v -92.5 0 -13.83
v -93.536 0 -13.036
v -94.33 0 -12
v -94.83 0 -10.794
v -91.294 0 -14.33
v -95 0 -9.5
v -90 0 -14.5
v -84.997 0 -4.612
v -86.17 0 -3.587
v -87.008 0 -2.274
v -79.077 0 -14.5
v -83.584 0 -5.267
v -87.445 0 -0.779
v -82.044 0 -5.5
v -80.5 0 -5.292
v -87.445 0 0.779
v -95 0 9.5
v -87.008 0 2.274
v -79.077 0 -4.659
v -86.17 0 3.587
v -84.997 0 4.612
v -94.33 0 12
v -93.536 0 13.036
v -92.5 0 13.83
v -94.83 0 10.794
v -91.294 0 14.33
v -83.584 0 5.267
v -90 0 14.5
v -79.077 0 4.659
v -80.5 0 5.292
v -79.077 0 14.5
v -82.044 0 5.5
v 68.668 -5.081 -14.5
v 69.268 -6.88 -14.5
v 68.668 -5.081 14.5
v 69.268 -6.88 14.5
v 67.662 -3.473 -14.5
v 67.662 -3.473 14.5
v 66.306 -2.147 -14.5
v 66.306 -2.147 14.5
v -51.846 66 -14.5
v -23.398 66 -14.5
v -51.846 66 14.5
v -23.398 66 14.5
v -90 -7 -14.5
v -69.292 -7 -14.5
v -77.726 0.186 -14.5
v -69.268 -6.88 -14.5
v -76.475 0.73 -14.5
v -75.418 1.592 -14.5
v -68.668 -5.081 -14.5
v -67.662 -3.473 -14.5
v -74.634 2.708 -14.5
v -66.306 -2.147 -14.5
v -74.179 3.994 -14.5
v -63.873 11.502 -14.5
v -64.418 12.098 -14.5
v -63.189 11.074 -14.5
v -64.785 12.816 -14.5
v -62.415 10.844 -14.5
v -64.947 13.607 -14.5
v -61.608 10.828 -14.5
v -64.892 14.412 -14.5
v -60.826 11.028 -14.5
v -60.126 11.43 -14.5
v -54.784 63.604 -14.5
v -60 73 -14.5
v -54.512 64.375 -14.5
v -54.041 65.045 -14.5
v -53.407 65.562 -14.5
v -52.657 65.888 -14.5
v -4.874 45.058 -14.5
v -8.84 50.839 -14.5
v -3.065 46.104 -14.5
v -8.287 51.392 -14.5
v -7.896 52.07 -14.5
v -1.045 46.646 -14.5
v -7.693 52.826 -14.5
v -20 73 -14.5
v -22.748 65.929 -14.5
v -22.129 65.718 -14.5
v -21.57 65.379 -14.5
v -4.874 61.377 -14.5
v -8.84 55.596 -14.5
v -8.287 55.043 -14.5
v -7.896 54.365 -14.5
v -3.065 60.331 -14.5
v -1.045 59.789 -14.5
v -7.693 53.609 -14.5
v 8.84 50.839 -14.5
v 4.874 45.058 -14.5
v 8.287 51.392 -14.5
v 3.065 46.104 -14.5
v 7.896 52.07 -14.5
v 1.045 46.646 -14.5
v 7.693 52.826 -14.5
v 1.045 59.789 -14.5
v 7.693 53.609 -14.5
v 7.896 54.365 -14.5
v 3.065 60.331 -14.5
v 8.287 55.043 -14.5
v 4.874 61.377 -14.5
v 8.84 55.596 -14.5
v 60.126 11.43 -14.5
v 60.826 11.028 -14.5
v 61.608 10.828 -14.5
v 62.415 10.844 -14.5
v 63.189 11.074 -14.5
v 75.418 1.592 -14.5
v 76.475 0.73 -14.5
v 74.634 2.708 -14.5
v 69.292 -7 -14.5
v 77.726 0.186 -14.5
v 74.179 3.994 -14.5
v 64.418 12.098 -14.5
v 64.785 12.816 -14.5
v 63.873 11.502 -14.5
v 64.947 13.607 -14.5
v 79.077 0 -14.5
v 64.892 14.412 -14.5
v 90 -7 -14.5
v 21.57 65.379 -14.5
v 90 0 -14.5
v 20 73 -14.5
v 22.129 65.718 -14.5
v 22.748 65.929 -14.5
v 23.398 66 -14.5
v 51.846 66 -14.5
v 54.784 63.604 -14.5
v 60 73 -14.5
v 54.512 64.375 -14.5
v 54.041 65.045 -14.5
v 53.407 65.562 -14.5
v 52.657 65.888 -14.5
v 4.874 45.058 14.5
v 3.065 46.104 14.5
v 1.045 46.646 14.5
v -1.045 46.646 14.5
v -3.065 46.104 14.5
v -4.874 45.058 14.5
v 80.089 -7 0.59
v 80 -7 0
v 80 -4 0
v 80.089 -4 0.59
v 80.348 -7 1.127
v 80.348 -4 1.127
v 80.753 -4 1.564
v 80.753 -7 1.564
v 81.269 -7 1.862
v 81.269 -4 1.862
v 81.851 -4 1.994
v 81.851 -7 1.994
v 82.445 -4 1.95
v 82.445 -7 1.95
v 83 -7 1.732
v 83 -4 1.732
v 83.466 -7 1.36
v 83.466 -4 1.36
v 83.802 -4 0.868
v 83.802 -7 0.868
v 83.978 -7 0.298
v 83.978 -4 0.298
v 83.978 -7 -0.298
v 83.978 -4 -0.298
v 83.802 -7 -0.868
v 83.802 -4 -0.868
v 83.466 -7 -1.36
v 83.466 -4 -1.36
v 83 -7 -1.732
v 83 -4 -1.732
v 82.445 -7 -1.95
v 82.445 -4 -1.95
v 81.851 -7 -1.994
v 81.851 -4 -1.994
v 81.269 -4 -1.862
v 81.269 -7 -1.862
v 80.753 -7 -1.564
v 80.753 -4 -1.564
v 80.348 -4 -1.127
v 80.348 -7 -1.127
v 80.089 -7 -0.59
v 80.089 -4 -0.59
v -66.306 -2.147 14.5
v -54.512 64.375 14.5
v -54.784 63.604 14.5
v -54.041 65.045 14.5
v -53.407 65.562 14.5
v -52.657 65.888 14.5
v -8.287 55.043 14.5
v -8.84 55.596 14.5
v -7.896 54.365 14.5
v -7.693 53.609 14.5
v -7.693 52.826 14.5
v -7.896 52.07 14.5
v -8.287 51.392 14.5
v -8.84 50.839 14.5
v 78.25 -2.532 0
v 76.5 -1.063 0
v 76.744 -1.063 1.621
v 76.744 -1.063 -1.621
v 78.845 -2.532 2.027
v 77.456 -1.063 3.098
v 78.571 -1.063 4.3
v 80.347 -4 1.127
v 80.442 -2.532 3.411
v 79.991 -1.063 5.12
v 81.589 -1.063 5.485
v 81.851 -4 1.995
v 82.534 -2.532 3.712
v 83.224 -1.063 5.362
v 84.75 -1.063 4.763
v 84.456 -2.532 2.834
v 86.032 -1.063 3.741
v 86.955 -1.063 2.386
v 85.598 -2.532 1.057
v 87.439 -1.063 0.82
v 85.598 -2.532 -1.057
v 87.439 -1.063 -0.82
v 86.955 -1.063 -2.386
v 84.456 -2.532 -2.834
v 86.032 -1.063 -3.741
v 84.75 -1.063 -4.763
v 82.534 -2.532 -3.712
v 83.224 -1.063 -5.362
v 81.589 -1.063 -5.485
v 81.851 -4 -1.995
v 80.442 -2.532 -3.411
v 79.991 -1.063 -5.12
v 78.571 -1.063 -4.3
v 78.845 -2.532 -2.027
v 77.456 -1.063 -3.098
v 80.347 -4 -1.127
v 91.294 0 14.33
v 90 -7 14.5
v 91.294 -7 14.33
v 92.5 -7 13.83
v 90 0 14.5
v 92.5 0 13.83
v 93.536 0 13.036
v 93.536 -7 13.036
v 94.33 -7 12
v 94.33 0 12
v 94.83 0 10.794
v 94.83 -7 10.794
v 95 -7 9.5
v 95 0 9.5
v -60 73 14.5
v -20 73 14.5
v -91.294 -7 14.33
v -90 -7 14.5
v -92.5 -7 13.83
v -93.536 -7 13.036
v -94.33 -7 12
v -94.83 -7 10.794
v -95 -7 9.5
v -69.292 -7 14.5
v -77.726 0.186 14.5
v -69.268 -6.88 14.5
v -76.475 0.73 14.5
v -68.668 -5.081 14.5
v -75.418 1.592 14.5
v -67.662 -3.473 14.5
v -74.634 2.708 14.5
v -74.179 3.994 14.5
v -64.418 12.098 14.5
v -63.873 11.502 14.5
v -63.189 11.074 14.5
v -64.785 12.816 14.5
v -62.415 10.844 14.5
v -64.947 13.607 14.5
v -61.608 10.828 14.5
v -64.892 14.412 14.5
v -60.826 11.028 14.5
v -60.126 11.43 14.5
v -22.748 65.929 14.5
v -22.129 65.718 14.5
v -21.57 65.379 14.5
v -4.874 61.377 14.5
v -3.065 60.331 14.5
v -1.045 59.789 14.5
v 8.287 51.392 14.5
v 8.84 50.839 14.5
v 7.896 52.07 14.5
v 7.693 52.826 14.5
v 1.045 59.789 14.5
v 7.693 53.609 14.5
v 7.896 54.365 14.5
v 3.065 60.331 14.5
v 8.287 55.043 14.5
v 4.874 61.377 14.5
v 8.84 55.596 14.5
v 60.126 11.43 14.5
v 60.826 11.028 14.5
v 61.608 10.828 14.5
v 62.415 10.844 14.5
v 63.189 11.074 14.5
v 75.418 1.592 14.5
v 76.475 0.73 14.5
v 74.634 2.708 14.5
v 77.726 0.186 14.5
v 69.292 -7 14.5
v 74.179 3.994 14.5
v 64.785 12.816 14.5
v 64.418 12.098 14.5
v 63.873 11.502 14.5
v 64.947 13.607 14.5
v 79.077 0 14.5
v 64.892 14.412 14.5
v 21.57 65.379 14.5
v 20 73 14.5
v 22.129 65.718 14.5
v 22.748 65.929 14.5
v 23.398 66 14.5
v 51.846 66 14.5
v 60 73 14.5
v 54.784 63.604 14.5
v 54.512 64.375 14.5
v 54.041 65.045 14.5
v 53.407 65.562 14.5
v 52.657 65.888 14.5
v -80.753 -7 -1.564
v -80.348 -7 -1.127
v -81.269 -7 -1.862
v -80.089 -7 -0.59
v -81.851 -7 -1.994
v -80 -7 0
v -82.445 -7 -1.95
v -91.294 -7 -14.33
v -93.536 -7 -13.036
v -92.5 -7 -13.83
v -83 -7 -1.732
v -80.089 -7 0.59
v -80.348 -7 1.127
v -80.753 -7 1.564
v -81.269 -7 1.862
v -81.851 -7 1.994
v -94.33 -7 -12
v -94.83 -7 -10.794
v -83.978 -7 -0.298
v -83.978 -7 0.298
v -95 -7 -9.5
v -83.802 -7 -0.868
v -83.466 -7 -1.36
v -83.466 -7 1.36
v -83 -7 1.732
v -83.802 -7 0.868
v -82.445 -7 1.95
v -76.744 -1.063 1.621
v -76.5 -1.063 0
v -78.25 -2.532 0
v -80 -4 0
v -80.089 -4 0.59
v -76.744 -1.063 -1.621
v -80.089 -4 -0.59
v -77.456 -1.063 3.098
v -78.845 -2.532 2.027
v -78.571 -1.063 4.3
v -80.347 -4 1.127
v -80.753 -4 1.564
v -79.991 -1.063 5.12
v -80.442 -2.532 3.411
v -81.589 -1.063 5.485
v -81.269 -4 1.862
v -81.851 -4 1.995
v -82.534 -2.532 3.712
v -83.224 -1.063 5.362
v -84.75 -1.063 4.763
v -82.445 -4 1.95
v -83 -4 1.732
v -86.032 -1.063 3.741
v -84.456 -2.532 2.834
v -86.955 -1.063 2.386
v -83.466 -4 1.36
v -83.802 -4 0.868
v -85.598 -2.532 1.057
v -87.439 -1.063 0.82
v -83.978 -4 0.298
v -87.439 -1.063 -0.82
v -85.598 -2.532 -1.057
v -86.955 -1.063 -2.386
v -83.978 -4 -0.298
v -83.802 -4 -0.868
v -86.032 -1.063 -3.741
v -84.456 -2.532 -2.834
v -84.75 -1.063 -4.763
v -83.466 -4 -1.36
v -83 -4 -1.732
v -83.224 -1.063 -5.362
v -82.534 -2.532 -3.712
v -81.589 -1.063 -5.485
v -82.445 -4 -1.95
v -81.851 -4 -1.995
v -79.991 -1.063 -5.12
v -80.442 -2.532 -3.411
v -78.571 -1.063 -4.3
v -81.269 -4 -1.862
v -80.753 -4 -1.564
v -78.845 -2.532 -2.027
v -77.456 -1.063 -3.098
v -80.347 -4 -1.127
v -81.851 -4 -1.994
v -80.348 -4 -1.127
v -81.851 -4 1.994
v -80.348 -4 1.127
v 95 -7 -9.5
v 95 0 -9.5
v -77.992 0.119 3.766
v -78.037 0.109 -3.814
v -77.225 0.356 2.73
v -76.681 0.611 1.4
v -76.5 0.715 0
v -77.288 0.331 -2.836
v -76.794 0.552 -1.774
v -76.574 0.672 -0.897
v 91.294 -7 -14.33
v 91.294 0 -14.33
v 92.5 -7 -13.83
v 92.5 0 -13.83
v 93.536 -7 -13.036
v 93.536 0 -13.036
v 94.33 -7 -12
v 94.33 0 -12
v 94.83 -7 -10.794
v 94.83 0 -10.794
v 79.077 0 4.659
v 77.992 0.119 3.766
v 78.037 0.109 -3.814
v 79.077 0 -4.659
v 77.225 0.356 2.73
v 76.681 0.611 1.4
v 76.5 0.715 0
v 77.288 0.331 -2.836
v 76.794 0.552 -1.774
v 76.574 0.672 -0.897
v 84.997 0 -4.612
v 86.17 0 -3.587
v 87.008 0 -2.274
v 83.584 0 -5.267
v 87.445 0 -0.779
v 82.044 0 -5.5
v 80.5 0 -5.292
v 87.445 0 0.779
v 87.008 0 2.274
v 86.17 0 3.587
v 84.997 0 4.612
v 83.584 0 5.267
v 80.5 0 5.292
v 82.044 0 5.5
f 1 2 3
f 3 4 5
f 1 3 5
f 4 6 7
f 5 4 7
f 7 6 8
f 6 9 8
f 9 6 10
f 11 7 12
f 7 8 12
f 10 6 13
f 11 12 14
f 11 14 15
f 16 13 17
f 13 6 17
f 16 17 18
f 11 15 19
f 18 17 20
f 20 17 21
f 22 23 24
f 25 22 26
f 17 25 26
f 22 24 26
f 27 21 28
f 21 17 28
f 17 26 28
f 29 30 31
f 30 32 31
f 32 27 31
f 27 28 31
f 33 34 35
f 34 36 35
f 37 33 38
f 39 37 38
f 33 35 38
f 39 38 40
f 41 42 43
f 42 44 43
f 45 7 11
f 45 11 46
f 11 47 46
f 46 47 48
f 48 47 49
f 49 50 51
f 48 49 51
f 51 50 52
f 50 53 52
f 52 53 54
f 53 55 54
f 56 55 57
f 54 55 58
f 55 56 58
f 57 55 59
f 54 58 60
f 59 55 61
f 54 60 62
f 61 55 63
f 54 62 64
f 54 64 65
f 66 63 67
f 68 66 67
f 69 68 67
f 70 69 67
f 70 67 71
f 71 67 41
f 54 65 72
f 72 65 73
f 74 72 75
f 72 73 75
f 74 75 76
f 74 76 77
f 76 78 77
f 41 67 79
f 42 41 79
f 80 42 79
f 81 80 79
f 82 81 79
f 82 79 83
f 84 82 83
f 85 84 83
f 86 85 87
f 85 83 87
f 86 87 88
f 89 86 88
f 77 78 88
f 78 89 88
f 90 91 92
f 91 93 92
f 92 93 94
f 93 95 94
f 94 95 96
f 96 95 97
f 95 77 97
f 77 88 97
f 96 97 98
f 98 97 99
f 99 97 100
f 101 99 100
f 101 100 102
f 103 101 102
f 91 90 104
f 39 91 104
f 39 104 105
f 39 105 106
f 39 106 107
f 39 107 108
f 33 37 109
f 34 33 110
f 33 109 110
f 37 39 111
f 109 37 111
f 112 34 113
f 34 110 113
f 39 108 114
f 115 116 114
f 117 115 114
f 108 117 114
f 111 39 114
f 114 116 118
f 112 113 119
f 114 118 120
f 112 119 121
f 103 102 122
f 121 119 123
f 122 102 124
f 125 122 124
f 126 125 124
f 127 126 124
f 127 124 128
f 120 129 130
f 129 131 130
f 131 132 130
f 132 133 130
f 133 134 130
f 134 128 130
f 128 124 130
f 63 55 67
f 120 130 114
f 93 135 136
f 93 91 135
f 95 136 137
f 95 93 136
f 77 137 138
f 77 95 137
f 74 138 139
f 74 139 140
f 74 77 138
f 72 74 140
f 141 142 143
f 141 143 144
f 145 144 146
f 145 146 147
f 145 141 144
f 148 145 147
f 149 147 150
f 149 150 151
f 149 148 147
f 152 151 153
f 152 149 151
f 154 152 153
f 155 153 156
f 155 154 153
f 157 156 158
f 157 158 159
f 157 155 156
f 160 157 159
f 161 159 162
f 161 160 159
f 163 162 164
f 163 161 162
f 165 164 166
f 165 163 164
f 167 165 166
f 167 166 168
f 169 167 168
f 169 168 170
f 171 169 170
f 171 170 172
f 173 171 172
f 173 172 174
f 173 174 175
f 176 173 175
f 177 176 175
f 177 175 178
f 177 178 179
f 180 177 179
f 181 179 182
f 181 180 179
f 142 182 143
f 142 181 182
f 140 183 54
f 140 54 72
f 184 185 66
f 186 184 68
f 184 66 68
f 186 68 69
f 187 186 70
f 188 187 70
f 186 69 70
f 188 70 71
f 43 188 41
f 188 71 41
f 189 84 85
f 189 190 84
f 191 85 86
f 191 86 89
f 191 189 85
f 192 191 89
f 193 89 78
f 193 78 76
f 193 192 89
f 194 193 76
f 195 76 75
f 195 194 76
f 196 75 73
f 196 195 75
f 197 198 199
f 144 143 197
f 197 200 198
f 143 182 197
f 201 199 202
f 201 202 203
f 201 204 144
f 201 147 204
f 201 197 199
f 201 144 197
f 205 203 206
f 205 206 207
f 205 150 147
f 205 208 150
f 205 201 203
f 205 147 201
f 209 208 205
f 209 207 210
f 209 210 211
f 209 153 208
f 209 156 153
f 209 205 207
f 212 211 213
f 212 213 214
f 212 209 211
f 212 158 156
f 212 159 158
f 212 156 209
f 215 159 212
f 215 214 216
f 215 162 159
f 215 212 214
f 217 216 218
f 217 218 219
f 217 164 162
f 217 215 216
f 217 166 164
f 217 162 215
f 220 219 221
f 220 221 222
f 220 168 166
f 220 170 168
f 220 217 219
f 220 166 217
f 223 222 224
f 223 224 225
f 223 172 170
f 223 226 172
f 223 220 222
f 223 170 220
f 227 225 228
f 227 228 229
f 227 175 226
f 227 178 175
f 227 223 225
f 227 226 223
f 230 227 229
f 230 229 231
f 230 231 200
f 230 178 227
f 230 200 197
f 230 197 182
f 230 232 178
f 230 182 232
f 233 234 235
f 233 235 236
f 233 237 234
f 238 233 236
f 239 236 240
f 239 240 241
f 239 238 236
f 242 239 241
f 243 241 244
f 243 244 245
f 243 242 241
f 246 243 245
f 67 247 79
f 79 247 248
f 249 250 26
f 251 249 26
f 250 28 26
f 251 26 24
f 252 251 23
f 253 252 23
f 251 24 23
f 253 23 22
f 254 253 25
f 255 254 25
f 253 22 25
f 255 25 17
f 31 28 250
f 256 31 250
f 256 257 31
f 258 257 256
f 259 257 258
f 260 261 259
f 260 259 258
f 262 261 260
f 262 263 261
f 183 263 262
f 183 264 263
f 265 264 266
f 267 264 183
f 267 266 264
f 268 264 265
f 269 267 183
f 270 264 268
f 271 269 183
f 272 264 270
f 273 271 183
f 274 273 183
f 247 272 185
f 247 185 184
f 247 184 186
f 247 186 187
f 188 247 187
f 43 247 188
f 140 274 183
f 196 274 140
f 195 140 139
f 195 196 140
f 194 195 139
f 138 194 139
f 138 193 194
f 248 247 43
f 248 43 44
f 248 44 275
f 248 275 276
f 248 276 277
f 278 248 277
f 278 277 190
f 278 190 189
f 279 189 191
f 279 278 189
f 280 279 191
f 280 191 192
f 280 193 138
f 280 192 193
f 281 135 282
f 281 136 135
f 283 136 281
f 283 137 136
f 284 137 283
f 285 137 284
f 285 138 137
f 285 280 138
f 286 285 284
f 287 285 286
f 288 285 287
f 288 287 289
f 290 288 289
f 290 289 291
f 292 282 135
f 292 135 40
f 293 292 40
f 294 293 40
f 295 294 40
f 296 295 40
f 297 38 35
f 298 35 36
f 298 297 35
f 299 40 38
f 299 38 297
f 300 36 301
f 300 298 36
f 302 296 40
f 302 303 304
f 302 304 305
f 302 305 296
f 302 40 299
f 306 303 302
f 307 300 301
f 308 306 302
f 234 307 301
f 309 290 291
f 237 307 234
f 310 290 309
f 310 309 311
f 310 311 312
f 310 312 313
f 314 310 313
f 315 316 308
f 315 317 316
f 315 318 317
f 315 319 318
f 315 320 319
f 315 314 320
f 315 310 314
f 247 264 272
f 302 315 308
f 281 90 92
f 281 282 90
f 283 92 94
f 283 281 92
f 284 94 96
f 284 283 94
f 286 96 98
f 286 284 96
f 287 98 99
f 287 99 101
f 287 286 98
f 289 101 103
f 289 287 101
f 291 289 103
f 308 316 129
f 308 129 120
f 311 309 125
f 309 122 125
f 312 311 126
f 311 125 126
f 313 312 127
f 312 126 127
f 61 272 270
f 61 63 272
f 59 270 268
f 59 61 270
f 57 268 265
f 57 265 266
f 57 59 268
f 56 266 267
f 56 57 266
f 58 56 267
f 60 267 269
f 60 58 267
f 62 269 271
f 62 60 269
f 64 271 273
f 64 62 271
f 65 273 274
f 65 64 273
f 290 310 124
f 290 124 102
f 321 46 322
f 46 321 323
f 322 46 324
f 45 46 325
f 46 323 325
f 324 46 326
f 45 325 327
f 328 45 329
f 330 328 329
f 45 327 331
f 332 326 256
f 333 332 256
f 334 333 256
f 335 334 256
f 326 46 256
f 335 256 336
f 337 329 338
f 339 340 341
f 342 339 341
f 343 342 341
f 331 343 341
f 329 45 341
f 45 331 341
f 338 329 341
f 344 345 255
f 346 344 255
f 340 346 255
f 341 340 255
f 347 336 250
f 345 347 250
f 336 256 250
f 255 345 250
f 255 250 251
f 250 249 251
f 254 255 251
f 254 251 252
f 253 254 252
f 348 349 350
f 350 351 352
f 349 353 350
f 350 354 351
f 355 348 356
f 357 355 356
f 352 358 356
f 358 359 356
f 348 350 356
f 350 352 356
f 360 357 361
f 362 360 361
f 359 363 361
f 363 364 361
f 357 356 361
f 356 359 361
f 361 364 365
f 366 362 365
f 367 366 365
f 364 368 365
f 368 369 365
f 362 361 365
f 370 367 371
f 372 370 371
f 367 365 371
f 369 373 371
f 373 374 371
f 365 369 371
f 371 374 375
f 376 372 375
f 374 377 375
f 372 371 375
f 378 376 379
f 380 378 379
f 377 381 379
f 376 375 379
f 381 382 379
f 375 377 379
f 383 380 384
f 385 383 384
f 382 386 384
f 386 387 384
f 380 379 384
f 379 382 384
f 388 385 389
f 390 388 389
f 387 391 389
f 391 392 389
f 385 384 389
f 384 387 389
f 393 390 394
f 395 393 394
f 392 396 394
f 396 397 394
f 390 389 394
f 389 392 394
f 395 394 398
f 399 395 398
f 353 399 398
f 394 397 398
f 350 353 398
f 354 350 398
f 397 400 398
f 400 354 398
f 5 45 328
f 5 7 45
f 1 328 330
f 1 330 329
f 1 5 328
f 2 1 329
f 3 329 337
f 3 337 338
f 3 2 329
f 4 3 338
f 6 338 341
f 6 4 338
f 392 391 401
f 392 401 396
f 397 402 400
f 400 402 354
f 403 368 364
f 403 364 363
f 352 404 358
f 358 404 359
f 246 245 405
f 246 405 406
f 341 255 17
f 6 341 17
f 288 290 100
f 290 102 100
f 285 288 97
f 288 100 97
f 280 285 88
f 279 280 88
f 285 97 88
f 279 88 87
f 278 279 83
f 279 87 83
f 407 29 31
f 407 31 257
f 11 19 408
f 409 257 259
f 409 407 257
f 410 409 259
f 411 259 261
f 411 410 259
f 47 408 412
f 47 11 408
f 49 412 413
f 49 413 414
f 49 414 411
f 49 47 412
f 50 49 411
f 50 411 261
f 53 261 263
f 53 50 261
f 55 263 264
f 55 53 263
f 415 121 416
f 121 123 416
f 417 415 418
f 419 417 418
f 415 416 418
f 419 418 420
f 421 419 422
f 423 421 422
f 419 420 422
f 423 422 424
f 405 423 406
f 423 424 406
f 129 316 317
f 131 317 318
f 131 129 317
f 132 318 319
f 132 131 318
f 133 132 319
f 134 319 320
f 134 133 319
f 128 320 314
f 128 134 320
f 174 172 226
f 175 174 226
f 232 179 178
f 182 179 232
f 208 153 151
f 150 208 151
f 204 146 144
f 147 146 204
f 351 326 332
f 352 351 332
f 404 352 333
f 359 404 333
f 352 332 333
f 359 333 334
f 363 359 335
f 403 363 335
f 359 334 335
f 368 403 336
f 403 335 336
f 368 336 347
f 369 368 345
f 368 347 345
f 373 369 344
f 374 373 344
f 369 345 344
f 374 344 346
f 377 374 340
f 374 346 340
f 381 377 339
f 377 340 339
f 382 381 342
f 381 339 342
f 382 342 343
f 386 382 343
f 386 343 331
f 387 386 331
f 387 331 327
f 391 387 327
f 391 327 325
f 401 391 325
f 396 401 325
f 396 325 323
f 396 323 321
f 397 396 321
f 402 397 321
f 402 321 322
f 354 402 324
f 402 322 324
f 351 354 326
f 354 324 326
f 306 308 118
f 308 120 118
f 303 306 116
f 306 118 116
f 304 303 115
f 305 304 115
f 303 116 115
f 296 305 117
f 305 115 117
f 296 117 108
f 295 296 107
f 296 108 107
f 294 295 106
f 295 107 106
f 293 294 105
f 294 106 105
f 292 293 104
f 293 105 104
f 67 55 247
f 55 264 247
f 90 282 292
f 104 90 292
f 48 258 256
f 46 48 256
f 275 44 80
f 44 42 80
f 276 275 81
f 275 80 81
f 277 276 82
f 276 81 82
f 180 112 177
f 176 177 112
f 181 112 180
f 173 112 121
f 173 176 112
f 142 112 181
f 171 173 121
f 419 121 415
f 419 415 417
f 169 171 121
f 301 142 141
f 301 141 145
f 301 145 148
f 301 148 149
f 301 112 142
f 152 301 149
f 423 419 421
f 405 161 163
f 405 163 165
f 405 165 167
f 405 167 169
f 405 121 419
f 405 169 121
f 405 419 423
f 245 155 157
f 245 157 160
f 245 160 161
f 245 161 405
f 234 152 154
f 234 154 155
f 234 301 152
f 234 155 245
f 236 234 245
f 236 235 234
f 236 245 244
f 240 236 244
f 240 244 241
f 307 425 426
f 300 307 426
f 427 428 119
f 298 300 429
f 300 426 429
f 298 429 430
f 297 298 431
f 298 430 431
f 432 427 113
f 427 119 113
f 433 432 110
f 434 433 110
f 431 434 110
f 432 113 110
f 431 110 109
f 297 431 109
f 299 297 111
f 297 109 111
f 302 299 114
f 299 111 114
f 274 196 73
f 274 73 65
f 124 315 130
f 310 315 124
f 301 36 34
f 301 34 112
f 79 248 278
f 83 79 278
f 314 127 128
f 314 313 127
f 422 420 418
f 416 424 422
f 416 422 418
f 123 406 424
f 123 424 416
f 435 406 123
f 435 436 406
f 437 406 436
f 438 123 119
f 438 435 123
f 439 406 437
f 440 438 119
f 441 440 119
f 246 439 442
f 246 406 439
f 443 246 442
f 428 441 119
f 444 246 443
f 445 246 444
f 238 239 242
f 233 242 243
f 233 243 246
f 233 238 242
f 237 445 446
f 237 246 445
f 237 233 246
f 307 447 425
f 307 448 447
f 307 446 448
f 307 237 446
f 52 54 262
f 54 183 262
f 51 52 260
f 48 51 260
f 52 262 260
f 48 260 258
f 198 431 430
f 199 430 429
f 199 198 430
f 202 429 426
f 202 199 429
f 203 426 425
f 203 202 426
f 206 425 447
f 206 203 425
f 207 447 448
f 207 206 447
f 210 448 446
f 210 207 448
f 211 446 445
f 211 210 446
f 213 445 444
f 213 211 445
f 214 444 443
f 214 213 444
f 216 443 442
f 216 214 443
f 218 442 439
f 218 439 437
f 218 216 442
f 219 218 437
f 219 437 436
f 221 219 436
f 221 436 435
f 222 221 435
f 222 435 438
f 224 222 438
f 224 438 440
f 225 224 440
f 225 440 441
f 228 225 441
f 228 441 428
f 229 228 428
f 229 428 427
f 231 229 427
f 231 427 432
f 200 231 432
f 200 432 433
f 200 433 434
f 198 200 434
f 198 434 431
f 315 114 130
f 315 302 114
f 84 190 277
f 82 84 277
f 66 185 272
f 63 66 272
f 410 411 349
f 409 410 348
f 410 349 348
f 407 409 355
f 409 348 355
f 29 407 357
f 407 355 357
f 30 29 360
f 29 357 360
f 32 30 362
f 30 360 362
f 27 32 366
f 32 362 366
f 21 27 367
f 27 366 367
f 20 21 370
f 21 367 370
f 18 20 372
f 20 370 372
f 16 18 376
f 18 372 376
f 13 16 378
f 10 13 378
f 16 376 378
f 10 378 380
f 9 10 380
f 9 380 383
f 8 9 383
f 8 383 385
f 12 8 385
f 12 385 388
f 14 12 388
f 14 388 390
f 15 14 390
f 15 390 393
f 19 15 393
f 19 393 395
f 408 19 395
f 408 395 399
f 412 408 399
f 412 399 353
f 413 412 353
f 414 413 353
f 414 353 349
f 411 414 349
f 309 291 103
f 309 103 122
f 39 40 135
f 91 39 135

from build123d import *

# Parameters (mm, degrees)
EXTRU_MINCE1_DEPTH      = 14.5
CONG_1_R                = 5
CONG_2_R                = 5
ESQUISSE4_R             = 2
ENL_V_MAT_EXTRU_1_DEPTH = 3
ESQUISSE5_R             = 5.5
ENL_V_MAT_EXTRU_2_DEPTH = 124.143209313
CHANFREIN1_SIZE2        = 3.5
CHANFREIN1_SIZE         = 2.936848709
CONG_3_R                = 8
CONG_4_R                = 3


with BuildPart() as part:
    # Esquisse1 → Extru.-Mince1 (new, symmetric)
    with BuildSketch(Plane.XY):
        Polygon((-95, 0), (-75, 0), (-60, 73), (-20, 73), (75, 0), (70.734848823, -5.550539203), (-22.378866577, 66), (-54.292107606, 66), (-69.292107606, -7), (-95, -7), align=None)
    extrude(amount=EXTRU_MINCE1_DEPTH, both=True)

    # Congé1
    cong_1_edges = [part.edges().sort_by_distance(p)[0] for p in [
        (-95, -3.5, 14.5),
        (-95, -3.5, -14.5),
    ]]
    fillet(cong_1_edges, radius=CONG_1_R)

    # Congé2
    cong_2_edges = [part.edges().sort_by_distance(p)[0] for p in [
        (-75, 0, 0),
    ]]
    fillet(cong_2_edges, radius=CONG_2_R)

    # Esquisse4 → Enlèv. mat.-Extru.1 (cut)
    with BuildSketch(Plane.XZ.offset(7)):
        with Locations((-82, 0)):
            Circle(ESQUISSE4_R)
    extrude(amount=-ENL_V_MAT_EXTRU_1_DEPTH, mode=Mode.SUBTRACT)

    # Esquisse5 → Enlèv. mat.-Extru.2 (cut, through all)
    with BuildSketch(Plane.XZ.offset(4)):
        with Locations((-82, 0)):
            Circle(ESQUISSE5_R)
    extrude(amount=-ENL_V_MAT_EXTRU_2_DEPTH, mode=Mode.SUBTRACT)

    # Chanfrein1
    chanfrein1_edges = [part.edges().sort_by_distance(p)[0] for p in [
        (-87.5, -4, 0),
    ]]
    chanfrein1_side = [part.faces().sort_by_distance(p)[0] for p in [
        (-87.5, -3.941263026, 0),
    ]]
    chamfer(chanfrein1_edges, length=CHANFREIN1_SIZE - 0.0001, length2=CHANFREIN1_SIZE2 - 0.0001, reference=chanfrein1_side[0])  # a hair under: the kernel refuses the full size

    # Symétrie1: part across plane


with BuildPart() as part_1:
    add(part.part)
    add(part.part.mirror(Plane(origin=(0, 0, 0), x_dir=(0, 0, 1), z_dir=(1, 0, 0))))

    # Congé3
    cong_3_edges = [part_1.edges().sort_by_distance(p)[0] for p in [
        (0, 48.803607788, 0),
        (-68.667915266, -3.962263942, 0),
        (0, 57.631578947, 0),
        (68.667915266, -3.962263942, 0),
    ]]
    fillet(cong_3_edges, radius=CONG_3_R)

    # Congé4
    cong_4_edges = [part_1.edges().sort_by_distance(p)[0] for p in [
        (-22.378866577, 66, 0),
        (-54.292107606, 66, 0),
        (5.744227809, 53.217593368, 0),
        (-5.744227809, 53.217593368, 0),
        (66.513829837, 6.520951809, 0),
        (-66.513829837, 6.520951809, 0),
        (54.292107606, 66, 0),
        (22.378866577, 66, 0),
    ]]
    fillet(cong_4_edges, radius=CONG_4_R)


solid = part_1.part
